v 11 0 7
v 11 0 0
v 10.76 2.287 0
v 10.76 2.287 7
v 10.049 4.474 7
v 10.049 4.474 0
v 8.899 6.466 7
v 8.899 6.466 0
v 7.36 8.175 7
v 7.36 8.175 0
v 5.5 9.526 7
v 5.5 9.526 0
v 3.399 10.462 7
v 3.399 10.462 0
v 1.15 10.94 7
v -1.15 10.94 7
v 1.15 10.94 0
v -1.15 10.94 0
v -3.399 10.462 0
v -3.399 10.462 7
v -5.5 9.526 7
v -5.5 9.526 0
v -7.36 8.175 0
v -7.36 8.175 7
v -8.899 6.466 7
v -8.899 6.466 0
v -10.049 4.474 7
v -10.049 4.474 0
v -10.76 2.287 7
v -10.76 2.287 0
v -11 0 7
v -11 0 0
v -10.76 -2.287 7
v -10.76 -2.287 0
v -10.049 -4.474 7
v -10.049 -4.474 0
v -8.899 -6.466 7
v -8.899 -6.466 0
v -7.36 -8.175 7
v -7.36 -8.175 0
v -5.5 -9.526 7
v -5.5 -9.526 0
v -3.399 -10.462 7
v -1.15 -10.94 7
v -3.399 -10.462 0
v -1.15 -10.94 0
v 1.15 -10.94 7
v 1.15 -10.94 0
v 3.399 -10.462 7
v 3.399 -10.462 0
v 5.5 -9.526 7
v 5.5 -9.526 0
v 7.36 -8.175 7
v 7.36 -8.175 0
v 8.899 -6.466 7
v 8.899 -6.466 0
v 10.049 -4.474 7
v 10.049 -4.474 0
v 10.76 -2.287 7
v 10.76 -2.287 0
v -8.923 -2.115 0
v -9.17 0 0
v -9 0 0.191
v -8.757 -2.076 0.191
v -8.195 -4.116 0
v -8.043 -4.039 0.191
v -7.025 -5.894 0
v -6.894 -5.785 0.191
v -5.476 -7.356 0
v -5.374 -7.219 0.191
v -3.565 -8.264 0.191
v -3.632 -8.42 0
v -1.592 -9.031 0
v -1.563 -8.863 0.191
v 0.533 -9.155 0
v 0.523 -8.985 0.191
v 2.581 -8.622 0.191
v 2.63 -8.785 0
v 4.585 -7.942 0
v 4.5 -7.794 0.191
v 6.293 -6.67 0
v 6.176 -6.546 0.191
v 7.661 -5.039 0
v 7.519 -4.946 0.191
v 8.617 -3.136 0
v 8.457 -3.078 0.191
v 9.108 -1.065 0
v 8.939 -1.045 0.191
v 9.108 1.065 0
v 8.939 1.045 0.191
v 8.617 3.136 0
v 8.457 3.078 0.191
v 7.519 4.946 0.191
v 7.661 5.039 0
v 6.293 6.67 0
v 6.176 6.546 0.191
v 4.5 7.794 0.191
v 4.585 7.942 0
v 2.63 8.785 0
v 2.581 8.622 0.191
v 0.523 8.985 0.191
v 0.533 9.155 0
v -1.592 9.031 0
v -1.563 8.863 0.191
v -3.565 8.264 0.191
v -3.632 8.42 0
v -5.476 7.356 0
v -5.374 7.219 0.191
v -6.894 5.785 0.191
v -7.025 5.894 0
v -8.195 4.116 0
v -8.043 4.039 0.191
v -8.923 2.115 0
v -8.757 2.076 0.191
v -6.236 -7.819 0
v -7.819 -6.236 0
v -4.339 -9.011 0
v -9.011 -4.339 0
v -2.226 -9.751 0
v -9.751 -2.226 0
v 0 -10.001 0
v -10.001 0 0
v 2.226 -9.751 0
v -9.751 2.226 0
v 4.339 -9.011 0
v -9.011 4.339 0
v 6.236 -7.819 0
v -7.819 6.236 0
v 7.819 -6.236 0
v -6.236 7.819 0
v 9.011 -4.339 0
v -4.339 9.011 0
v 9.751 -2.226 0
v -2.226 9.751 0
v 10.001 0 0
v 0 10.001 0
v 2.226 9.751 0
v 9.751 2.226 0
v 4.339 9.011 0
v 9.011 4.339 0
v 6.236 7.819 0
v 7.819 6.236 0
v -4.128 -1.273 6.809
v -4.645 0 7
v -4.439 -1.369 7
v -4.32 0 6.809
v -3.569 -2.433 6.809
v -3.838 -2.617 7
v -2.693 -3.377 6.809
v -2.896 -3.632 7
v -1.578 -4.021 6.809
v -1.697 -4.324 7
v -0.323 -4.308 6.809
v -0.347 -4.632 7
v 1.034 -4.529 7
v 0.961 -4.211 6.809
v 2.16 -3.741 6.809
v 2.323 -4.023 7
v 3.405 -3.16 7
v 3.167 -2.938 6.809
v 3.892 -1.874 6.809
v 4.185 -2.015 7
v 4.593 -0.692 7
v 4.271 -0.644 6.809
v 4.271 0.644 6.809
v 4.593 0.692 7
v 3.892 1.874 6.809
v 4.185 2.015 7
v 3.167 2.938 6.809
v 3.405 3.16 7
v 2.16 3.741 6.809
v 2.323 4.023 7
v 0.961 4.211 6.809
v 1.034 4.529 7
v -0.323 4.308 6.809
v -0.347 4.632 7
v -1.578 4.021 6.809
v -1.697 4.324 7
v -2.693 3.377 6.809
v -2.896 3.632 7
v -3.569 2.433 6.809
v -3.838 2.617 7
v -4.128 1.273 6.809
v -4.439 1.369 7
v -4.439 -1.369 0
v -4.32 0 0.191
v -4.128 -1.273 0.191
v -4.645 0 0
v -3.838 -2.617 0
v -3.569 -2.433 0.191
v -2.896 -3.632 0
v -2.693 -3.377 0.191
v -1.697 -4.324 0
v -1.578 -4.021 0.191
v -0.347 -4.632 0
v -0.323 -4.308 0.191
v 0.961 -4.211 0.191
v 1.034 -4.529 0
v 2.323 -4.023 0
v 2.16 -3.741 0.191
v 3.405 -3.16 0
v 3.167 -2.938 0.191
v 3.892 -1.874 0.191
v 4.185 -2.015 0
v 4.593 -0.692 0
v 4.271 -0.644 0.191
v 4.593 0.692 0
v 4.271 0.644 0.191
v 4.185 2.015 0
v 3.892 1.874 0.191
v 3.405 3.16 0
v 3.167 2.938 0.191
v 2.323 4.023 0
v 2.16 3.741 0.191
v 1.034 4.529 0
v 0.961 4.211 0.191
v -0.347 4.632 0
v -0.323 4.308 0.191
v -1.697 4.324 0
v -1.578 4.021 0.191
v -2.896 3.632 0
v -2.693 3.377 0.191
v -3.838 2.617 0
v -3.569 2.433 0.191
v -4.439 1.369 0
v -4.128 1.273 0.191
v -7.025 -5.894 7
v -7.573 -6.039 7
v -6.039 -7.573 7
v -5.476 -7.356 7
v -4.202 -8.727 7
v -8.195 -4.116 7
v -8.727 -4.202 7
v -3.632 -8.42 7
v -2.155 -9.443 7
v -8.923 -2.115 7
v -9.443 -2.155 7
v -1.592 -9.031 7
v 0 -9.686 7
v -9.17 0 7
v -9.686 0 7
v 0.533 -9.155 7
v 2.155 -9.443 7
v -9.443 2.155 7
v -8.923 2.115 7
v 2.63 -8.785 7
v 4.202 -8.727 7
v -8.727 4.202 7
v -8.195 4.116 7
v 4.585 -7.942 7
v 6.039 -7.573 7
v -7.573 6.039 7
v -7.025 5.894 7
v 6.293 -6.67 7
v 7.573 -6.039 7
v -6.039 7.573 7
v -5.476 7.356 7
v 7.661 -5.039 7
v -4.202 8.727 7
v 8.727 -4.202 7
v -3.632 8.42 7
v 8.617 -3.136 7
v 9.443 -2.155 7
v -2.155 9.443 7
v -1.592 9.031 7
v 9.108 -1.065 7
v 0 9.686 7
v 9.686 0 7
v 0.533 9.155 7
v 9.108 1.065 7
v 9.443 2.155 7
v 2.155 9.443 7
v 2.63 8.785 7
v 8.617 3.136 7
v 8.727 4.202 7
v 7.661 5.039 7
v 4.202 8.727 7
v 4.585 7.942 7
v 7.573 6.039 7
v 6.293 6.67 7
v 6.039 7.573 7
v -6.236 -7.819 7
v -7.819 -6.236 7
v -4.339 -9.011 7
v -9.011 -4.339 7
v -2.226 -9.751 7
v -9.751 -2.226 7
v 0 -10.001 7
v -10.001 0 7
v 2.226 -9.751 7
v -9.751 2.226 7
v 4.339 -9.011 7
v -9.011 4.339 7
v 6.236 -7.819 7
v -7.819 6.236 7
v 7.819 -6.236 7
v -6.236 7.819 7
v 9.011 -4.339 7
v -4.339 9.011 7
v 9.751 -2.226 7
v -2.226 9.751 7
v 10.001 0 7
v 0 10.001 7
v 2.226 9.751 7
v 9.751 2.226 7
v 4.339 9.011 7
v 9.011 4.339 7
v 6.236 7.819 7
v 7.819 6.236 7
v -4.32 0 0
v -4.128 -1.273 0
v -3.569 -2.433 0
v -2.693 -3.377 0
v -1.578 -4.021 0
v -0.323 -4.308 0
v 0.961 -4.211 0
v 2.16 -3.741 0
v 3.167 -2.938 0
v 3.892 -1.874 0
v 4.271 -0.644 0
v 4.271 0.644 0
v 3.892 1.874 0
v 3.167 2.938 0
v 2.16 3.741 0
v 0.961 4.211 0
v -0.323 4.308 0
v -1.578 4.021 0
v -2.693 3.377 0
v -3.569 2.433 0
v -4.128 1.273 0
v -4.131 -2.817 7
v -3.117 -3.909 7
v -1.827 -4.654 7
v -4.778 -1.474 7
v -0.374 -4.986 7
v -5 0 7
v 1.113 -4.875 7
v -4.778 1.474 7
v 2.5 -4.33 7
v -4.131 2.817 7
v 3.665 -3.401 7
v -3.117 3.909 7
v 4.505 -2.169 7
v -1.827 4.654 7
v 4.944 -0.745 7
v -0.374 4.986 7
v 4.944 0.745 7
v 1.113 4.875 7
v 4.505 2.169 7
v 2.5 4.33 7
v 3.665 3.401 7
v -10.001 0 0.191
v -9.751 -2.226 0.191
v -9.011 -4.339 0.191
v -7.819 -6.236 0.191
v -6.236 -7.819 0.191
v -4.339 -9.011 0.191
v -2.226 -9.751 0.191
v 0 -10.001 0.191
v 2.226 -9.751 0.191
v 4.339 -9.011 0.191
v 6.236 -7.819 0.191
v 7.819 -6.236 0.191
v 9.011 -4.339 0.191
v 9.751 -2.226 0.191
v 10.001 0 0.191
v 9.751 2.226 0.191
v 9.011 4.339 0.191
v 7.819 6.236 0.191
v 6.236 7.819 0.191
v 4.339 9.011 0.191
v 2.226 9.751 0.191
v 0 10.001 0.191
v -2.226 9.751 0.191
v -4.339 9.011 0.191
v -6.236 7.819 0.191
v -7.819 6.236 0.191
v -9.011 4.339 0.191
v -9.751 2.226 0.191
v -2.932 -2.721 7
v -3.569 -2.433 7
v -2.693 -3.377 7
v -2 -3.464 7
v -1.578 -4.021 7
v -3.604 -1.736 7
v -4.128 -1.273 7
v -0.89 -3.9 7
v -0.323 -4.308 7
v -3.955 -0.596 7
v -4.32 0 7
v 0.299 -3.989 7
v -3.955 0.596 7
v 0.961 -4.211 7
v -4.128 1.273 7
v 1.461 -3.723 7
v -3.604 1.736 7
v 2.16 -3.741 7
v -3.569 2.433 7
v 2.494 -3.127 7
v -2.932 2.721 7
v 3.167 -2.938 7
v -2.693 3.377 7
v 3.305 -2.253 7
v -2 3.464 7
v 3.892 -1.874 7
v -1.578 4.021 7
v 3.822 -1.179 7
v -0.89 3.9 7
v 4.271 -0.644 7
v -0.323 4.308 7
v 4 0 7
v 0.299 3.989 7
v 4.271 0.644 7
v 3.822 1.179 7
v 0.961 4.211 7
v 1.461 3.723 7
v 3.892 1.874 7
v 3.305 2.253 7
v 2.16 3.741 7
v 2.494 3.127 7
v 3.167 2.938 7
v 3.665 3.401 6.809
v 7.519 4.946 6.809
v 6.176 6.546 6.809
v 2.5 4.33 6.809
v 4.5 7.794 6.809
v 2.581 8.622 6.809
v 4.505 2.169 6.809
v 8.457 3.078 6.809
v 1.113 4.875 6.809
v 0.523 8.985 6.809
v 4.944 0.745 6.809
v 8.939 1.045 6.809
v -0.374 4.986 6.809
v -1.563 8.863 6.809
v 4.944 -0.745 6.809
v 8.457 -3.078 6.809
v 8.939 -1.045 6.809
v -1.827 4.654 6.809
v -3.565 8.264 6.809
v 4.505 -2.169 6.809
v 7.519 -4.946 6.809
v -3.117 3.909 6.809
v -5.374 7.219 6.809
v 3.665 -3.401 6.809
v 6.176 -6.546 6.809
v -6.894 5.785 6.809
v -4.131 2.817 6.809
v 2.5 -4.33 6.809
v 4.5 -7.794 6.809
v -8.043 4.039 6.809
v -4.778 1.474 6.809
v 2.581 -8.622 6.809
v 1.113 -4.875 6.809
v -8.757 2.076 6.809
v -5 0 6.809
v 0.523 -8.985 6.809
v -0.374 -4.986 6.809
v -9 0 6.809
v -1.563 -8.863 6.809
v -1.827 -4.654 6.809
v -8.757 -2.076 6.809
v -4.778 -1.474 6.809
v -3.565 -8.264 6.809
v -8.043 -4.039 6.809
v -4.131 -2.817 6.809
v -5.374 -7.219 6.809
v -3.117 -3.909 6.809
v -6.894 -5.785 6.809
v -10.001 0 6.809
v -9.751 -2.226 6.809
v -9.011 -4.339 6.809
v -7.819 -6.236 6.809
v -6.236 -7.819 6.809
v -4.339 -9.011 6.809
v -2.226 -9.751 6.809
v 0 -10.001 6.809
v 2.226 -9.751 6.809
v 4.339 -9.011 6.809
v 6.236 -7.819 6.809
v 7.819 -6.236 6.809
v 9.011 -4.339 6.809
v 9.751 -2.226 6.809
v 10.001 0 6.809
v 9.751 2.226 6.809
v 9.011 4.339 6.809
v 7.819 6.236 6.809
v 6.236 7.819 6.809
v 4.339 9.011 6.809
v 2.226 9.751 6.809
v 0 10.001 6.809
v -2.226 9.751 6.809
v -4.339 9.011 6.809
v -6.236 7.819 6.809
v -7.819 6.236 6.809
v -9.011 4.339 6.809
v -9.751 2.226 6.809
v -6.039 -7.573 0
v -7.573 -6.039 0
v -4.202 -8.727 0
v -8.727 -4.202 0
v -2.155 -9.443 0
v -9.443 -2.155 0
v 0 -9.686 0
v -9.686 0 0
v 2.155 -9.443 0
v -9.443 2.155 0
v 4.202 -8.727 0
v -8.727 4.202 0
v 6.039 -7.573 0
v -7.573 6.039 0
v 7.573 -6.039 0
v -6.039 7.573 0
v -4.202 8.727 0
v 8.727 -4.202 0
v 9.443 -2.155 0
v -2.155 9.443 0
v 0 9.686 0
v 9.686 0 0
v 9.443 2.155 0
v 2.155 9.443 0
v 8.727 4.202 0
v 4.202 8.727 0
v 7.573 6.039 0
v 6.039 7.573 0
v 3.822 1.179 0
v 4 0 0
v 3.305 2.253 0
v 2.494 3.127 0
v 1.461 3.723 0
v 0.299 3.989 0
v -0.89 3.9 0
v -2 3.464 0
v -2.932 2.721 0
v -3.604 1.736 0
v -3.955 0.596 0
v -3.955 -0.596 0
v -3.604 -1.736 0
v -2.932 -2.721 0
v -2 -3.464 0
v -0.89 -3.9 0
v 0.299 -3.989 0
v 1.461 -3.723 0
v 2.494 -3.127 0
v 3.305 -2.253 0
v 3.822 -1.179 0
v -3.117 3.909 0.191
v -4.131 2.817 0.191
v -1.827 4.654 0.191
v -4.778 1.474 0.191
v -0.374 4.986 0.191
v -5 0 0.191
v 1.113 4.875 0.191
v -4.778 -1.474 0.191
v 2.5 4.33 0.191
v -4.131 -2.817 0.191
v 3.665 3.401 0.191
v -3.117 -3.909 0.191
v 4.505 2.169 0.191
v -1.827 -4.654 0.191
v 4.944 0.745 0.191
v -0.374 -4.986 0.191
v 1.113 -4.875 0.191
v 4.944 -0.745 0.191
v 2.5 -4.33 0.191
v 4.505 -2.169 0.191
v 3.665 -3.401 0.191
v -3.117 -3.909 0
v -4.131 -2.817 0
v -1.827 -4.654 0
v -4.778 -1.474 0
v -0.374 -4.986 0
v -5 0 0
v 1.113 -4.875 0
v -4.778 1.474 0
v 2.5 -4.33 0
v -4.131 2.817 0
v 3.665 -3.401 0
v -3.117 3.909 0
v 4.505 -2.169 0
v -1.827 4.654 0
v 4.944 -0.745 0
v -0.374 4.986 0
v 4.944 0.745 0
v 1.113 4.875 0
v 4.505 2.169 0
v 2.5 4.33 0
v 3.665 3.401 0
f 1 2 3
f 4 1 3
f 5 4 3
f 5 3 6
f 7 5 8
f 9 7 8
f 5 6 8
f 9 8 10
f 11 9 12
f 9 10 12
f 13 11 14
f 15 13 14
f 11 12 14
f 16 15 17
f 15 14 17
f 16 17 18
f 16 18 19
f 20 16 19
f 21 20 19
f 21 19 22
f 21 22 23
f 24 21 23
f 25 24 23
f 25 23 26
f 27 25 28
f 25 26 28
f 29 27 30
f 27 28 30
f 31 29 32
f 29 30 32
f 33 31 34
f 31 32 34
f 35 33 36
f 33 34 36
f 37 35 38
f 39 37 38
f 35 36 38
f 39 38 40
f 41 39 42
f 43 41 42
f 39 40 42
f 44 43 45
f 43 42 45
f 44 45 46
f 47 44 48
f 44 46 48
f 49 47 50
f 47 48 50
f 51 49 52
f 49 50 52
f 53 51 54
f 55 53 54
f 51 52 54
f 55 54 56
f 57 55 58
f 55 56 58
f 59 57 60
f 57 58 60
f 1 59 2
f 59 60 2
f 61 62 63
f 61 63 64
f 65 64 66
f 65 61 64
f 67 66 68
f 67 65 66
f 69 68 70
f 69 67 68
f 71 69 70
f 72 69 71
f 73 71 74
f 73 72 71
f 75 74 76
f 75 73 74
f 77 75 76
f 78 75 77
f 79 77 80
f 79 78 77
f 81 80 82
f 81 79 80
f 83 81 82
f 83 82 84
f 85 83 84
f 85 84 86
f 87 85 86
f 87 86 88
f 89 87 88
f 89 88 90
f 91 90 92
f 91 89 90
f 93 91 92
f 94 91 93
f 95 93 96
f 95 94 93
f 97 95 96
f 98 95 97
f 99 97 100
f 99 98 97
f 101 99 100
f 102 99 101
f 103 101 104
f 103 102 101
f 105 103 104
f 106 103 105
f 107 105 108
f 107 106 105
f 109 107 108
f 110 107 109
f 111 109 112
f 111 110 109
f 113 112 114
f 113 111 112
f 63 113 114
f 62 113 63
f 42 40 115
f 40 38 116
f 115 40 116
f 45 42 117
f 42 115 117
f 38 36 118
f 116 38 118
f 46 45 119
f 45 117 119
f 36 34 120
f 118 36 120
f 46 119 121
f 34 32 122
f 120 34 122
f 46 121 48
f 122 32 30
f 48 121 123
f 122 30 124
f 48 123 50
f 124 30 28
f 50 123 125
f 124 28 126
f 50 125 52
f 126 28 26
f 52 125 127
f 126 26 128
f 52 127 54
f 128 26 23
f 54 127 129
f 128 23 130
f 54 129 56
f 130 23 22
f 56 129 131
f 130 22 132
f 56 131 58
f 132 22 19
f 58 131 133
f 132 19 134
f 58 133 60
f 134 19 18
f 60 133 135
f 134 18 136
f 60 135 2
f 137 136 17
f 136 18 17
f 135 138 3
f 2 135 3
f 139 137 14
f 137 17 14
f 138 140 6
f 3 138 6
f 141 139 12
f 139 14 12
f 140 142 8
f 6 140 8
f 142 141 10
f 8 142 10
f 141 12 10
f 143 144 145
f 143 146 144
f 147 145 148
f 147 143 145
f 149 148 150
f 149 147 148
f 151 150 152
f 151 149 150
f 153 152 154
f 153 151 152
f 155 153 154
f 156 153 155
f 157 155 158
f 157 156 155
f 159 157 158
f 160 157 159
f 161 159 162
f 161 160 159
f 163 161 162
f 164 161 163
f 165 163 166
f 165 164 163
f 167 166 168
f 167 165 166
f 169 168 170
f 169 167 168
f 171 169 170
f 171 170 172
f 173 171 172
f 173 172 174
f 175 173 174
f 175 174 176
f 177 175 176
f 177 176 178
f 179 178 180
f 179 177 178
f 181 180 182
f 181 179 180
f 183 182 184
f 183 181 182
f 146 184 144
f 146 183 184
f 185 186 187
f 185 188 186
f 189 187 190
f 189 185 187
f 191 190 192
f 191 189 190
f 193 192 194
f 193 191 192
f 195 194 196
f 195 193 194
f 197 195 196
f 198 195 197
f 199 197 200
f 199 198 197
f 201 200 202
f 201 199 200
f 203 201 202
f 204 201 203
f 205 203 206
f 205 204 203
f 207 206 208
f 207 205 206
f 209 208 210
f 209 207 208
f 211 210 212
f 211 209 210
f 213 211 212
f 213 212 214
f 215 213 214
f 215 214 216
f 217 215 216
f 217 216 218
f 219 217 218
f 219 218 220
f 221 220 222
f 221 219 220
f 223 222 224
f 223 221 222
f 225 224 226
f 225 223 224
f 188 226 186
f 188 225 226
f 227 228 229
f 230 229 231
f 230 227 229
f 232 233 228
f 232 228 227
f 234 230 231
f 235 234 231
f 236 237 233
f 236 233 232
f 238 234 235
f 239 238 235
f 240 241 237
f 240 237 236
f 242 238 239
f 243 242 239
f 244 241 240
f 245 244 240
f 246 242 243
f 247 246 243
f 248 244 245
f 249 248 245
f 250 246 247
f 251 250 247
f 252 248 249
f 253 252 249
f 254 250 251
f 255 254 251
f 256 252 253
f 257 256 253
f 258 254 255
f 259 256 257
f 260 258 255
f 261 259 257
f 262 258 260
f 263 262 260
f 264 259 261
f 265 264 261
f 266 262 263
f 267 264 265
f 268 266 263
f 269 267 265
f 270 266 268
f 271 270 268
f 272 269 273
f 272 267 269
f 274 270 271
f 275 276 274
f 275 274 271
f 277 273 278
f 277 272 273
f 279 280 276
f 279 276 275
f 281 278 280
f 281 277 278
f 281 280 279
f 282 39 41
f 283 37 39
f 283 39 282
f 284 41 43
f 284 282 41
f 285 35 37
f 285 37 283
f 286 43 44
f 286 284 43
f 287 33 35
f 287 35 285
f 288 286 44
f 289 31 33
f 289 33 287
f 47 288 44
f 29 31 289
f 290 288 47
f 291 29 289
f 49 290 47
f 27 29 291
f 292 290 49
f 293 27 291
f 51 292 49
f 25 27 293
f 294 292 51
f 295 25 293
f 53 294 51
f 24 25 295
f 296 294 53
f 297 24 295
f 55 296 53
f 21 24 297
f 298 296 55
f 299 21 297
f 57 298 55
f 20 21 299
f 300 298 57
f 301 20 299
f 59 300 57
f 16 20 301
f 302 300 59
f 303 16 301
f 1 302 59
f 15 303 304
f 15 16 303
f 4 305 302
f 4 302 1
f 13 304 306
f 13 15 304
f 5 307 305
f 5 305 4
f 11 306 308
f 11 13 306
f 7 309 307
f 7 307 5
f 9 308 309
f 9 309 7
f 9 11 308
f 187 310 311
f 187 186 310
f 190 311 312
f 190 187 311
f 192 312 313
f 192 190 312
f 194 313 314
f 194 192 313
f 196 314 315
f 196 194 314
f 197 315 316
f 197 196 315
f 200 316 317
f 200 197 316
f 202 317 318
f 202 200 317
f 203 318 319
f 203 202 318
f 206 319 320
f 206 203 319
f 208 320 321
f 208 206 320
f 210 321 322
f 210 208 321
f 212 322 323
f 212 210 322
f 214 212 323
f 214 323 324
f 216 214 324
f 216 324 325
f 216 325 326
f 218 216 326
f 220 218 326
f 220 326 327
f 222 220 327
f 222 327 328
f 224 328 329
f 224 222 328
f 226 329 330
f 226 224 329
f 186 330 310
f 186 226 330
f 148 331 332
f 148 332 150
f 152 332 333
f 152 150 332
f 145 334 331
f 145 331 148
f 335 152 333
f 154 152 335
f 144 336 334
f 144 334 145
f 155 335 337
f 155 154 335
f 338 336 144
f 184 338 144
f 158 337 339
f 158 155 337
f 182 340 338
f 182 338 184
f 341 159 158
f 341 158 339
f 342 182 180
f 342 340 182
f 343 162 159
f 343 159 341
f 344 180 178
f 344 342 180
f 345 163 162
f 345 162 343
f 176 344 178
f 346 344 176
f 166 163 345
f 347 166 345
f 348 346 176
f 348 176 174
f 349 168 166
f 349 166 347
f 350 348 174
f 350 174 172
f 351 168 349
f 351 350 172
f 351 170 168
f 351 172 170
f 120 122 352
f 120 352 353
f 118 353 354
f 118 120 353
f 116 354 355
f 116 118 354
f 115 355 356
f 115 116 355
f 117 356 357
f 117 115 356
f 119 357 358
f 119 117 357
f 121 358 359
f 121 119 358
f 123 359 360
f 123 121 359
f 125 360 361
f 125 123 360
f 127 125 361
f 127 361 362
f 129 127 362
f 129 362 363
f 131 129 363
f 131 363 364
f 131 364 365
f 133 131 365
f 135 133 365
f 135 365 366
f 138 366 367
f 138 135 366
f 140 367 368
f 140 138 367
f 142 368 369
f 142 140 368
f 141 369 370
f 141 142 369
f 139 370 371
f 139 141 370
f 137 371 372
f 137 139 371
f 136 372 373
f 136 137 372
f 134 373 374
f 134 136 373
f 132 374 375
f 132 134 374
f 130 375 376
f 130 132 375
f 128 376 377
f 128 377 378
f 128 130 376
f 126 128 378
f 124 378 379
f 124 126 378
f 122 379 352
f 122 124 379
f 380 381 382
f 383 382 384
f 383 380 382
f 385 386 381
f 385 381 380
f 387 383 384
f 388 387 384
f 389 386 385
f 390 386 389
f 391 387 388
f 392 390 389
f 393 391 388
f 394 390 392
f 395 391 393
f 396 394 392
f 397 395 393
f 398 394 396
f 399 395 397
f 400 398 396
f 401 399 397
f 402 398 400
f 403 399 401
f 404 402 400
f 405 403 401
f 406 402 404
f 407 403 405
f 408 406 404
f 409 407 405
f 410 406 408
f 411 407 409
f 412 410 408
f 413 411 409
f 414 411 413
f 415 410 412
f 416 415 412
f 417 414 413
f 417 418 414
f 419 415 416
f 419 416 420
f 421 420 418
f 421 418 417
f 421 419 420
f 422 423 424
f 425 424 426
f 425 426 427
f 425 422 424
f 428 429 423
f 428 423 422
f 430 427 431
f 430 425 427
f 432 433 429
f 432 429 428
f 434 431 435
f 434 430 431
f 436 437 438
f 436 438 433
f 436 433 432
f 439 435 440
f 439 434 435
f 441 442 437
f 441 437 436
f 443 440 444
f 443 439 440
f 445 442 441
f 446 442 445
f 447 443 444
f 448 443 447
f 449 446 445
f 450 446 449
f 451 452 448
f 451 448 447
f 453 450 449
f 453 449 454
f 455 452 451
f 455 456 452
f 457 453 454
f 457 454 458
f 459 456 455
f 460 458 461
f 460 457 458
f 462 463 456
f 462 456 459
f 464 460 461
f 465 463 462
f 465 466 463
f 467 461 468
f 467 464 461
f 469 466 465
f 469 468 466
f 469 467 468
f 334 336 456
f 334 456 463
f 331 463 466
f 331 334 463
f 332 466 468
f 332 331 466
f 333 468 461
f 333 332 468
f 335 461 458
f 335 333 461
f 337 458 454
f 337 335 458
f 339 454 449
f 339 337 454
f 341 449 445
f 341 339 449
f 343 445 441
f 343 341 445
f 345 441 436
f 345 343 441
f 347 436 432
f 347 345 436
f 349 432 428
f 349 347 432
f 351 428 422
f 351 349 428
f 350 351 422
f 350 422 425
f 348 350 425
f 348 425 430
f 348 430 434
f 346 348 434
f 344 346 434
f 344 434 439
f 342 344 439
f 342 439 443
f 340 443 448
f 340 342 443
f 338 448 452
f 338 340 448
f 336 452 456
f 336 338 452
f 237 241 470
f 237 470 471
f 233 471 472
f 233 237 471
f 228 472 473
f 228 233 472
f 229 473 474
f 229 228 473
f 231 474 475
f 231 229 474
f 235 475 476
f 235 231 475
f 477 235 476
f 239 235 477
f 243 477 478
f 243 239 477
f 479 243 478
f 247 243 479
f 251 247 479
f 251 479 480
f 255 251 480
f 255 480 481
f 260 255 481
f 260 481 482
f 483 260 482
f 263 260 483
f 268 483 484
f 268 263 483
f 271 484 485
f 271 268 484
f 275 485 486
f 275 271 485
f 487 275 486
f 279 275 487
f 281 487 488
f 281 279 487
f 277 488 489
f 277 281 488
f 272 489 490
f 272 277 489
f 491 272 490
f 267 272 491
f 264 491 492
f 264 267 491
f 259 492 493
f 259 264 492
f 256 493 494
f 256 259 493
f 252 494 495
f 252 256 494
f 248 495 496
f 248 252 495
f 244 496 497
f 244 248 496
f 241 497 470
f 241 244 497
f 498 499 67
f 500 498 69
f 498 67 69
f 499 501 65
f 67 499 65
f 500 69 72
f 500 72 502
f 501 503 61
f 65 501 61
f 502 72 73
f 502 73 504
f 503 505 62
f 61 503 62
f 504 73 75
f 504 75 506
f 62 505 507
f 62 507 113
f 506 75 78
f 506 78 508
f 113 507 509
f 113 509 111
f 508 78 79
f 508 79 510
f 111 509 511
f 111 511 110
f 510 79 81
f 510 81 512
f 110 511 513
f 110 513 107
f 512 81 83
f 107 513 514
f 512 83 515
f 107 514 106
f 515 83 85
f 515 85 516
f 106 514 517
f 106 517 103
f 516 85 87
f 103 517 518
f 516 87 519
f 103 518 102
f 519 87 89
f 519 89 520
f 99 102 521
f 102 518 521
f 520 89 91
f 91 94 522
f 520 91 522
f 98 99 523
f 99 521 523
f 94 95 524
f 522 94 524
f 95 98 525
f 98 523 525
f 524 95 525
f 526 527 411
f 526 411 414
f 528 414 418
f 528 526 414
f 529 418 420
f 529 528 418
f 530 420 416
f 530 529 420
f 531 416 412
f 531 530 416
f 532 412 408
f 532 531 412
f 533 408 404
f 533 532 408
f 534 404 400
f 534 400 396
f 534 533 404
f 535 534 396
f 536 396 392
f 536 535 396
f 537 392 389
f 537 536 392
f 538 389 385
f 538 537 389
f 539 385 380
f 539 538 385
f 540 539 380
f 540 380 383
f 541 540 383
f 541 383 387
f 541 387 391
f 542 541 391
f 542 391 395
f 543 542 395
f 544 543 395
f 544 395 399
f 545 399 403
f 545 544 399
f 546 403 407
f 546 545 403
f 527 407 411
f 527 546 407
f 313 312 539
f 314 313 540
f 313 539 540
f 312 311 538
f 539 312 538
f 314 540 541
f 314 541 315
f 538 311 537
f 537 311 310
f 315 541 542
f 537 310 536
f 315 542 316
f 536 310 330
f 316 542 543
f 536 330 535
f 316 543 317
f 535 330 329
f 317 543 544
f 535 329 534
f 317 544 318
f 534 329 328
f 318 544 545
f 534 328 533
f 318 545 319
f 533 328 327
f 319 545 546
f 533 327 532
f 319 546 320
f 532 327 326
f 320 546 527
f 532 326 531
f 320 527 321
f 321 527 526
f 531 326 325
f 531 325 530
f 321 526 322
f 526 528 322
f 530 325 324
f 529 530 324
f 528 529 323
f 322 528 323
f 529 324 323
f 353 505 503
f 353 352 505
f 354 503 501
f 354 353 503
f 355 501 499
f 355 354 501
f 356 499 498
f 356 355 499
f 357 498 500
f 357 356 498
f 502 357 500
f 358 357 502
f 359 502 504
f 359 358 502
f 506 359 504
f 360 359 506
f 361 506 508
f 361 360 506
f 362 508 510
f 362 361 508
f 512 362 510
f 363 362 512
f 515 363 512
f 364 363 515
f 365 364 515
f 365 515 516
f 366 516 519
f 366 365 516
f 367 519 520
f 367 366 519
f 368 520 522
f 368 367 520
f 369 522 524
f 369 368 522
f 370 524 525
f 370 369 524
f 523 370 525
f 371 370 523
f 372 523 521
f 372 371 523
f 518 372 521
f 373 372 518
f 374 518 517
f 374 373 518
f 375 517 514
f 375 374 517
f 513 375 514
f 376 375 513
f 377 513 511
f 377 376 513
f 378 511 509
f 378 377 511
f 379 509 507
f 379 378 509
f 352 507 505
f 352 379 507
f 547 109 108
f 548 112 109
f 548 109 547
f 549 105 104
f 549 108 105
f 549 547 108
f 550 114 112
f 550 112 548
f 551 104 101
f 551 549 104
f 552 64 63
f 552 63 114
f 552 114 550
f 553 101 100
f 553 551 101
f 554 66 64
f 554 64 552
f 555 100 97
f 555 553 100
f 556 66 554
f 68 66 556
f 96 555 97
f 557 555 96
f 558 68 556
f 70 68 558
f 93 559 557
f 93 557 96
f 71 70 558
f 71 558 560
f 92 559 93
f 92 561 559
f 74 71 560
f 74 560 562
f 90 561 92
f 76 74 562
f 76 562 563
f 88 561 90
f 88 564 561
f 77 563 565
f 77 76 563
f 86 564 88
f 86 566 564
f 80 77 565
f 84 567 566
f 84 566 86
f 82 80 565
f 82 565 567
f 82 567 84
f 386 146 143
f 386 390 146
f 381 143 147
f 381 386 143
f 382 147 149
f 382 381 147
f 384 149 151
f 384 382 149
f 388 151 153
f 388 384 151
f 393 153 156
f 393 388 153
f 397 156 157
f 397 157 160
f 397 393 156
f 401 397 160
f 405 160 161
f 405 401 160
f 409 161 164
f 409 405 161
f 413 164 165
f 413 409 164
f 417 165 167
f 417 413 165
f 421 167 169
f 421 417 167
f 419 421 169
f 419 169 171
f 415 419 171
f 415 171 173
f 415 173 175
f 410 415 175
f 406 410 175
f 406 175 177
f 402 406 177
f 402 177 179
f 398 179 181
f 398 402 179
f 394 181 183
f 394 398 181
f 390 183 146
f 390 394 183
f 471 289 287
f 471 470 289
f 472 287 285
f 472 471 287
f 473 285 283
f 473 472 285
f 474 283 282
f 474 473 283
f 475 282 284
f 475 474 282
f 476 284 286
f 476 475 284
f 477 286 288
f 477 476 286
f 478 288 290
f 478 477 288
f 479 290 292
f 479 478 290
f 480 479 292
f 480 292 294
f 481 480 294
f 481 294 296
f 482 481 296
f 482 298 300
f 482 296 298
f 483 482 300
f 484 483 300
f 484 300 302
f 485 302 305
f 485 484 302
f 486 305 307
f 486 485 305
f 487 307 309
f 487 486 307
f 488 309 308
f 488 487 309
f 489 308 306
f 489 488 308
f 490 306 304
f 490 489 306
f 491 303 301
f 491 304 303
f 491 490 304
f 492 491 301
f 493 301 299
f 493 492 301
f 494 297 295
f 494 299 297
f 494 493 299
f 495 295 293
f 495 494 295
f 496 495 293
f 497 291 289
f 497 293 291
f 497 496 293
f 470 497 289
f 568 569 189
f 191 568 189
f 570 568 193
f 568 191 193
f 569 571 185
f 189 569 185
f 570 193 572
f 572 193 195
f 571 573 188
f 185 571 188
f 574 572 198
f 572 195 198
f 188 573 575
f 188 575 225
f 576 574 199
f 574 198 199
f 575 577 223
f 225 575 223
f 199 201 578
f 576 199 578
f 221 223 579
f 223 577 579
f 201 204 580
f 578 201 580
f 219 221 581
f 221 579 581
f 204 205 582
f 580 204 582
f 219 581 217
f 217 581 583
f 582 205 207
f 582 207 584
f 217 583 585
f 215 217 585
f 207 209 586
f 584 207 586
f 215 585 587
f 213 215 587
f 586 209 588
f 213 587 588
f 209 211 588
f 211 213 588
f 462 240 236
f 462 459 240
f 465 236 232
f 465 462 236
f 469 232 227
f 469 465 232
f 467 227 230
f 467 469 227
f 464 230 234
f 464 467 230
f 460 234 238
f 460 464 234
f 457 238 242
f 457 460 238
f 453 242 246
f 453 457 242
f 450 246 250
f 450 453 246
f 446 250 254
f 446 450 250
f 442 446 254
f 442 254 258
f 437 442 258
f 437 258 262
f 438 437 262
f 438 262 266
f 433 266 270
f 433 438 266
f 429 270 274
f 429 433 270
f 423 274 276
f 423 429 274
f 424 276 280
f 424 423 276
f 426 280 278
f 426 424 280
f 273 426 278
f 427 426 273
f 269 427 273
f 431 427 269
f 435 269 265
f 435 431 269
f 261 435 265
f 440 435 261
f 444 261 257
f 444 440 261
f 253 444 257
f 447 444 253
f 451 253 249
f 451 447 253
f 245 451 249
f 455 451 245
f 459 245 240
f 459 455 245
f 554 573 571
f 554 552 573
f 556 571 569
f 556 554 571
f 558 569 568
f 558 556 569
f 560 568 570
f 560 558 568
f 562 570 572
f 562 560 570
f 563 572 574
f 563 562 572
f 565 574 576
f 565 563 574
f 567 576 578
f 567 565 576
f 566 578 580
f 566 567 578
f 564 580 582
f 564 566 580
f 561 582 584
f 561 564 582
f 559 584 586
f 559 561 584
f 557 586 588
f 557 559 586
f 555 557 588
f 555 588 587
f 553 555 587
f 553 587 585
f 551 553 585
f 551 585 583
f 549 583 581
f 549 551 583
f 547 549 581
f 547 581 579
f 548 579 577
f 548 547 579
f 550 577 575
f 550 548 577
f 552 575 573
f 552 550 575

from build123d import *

# Parameters (mm, degrees)
SKETCH1_R           = 11
SKETCH1_R_2         = 4
BOSS_EXTRUDE1_DEPTH = 7


with BuildPart() as part:
    # Sketch1 → Boss-Extrude1 (new body)
    with BuildSketch(Plane.XY):
        Circle(SKETCH1_R)
        Circle(SKETCH1_R_2, mode=Mode.SUBTRACT)
    extrude(amount=BOSS_EXTRUDE1_DEPTH)

    # Sketch2 → Cut-Revolve1 (revolve, cut)
    with BuildSketch(Plane(origin=(0, 0, 0), x_dir=(1, 0, 0), z_dir=(0, 1, 0))):
        Polygon((-9, -6.809352766), (-5, -6.809352766), (-5, -7.059352766), (-4.645185355, -7), (-4.319740766, -6.809352766), (-4.319740766, -7), (0, -7), (0, -9.290623362), (-10.991354846, -9.290623362), (-10.991354846, -7.309352766), (-10.001460887, -7.309352766), (-10.001460887, -6.809352766), (-9.350571708, -7.202353914), align=None)
        Polygon((-4.645185355, 0), (-5, 0.059352766), (-5, -0.190647234), (-9, -0.190647234), (-9.350571708, 0.202353914), (-10.001460887, -0.190647234), (-10.001460887, 0.309352766), (-10.991354846, 0.309352766), (-10.991354846, 2.290623362), (0, 2.290623362), (0, 0), (-4.319740766, 0), (-4.319740766, -0.190647234), align=None)
    revolve(axis=Axis((0, 0, 0), (0, 0, 1)), mode=Mode.SUBTRACT)


solid = part.part
